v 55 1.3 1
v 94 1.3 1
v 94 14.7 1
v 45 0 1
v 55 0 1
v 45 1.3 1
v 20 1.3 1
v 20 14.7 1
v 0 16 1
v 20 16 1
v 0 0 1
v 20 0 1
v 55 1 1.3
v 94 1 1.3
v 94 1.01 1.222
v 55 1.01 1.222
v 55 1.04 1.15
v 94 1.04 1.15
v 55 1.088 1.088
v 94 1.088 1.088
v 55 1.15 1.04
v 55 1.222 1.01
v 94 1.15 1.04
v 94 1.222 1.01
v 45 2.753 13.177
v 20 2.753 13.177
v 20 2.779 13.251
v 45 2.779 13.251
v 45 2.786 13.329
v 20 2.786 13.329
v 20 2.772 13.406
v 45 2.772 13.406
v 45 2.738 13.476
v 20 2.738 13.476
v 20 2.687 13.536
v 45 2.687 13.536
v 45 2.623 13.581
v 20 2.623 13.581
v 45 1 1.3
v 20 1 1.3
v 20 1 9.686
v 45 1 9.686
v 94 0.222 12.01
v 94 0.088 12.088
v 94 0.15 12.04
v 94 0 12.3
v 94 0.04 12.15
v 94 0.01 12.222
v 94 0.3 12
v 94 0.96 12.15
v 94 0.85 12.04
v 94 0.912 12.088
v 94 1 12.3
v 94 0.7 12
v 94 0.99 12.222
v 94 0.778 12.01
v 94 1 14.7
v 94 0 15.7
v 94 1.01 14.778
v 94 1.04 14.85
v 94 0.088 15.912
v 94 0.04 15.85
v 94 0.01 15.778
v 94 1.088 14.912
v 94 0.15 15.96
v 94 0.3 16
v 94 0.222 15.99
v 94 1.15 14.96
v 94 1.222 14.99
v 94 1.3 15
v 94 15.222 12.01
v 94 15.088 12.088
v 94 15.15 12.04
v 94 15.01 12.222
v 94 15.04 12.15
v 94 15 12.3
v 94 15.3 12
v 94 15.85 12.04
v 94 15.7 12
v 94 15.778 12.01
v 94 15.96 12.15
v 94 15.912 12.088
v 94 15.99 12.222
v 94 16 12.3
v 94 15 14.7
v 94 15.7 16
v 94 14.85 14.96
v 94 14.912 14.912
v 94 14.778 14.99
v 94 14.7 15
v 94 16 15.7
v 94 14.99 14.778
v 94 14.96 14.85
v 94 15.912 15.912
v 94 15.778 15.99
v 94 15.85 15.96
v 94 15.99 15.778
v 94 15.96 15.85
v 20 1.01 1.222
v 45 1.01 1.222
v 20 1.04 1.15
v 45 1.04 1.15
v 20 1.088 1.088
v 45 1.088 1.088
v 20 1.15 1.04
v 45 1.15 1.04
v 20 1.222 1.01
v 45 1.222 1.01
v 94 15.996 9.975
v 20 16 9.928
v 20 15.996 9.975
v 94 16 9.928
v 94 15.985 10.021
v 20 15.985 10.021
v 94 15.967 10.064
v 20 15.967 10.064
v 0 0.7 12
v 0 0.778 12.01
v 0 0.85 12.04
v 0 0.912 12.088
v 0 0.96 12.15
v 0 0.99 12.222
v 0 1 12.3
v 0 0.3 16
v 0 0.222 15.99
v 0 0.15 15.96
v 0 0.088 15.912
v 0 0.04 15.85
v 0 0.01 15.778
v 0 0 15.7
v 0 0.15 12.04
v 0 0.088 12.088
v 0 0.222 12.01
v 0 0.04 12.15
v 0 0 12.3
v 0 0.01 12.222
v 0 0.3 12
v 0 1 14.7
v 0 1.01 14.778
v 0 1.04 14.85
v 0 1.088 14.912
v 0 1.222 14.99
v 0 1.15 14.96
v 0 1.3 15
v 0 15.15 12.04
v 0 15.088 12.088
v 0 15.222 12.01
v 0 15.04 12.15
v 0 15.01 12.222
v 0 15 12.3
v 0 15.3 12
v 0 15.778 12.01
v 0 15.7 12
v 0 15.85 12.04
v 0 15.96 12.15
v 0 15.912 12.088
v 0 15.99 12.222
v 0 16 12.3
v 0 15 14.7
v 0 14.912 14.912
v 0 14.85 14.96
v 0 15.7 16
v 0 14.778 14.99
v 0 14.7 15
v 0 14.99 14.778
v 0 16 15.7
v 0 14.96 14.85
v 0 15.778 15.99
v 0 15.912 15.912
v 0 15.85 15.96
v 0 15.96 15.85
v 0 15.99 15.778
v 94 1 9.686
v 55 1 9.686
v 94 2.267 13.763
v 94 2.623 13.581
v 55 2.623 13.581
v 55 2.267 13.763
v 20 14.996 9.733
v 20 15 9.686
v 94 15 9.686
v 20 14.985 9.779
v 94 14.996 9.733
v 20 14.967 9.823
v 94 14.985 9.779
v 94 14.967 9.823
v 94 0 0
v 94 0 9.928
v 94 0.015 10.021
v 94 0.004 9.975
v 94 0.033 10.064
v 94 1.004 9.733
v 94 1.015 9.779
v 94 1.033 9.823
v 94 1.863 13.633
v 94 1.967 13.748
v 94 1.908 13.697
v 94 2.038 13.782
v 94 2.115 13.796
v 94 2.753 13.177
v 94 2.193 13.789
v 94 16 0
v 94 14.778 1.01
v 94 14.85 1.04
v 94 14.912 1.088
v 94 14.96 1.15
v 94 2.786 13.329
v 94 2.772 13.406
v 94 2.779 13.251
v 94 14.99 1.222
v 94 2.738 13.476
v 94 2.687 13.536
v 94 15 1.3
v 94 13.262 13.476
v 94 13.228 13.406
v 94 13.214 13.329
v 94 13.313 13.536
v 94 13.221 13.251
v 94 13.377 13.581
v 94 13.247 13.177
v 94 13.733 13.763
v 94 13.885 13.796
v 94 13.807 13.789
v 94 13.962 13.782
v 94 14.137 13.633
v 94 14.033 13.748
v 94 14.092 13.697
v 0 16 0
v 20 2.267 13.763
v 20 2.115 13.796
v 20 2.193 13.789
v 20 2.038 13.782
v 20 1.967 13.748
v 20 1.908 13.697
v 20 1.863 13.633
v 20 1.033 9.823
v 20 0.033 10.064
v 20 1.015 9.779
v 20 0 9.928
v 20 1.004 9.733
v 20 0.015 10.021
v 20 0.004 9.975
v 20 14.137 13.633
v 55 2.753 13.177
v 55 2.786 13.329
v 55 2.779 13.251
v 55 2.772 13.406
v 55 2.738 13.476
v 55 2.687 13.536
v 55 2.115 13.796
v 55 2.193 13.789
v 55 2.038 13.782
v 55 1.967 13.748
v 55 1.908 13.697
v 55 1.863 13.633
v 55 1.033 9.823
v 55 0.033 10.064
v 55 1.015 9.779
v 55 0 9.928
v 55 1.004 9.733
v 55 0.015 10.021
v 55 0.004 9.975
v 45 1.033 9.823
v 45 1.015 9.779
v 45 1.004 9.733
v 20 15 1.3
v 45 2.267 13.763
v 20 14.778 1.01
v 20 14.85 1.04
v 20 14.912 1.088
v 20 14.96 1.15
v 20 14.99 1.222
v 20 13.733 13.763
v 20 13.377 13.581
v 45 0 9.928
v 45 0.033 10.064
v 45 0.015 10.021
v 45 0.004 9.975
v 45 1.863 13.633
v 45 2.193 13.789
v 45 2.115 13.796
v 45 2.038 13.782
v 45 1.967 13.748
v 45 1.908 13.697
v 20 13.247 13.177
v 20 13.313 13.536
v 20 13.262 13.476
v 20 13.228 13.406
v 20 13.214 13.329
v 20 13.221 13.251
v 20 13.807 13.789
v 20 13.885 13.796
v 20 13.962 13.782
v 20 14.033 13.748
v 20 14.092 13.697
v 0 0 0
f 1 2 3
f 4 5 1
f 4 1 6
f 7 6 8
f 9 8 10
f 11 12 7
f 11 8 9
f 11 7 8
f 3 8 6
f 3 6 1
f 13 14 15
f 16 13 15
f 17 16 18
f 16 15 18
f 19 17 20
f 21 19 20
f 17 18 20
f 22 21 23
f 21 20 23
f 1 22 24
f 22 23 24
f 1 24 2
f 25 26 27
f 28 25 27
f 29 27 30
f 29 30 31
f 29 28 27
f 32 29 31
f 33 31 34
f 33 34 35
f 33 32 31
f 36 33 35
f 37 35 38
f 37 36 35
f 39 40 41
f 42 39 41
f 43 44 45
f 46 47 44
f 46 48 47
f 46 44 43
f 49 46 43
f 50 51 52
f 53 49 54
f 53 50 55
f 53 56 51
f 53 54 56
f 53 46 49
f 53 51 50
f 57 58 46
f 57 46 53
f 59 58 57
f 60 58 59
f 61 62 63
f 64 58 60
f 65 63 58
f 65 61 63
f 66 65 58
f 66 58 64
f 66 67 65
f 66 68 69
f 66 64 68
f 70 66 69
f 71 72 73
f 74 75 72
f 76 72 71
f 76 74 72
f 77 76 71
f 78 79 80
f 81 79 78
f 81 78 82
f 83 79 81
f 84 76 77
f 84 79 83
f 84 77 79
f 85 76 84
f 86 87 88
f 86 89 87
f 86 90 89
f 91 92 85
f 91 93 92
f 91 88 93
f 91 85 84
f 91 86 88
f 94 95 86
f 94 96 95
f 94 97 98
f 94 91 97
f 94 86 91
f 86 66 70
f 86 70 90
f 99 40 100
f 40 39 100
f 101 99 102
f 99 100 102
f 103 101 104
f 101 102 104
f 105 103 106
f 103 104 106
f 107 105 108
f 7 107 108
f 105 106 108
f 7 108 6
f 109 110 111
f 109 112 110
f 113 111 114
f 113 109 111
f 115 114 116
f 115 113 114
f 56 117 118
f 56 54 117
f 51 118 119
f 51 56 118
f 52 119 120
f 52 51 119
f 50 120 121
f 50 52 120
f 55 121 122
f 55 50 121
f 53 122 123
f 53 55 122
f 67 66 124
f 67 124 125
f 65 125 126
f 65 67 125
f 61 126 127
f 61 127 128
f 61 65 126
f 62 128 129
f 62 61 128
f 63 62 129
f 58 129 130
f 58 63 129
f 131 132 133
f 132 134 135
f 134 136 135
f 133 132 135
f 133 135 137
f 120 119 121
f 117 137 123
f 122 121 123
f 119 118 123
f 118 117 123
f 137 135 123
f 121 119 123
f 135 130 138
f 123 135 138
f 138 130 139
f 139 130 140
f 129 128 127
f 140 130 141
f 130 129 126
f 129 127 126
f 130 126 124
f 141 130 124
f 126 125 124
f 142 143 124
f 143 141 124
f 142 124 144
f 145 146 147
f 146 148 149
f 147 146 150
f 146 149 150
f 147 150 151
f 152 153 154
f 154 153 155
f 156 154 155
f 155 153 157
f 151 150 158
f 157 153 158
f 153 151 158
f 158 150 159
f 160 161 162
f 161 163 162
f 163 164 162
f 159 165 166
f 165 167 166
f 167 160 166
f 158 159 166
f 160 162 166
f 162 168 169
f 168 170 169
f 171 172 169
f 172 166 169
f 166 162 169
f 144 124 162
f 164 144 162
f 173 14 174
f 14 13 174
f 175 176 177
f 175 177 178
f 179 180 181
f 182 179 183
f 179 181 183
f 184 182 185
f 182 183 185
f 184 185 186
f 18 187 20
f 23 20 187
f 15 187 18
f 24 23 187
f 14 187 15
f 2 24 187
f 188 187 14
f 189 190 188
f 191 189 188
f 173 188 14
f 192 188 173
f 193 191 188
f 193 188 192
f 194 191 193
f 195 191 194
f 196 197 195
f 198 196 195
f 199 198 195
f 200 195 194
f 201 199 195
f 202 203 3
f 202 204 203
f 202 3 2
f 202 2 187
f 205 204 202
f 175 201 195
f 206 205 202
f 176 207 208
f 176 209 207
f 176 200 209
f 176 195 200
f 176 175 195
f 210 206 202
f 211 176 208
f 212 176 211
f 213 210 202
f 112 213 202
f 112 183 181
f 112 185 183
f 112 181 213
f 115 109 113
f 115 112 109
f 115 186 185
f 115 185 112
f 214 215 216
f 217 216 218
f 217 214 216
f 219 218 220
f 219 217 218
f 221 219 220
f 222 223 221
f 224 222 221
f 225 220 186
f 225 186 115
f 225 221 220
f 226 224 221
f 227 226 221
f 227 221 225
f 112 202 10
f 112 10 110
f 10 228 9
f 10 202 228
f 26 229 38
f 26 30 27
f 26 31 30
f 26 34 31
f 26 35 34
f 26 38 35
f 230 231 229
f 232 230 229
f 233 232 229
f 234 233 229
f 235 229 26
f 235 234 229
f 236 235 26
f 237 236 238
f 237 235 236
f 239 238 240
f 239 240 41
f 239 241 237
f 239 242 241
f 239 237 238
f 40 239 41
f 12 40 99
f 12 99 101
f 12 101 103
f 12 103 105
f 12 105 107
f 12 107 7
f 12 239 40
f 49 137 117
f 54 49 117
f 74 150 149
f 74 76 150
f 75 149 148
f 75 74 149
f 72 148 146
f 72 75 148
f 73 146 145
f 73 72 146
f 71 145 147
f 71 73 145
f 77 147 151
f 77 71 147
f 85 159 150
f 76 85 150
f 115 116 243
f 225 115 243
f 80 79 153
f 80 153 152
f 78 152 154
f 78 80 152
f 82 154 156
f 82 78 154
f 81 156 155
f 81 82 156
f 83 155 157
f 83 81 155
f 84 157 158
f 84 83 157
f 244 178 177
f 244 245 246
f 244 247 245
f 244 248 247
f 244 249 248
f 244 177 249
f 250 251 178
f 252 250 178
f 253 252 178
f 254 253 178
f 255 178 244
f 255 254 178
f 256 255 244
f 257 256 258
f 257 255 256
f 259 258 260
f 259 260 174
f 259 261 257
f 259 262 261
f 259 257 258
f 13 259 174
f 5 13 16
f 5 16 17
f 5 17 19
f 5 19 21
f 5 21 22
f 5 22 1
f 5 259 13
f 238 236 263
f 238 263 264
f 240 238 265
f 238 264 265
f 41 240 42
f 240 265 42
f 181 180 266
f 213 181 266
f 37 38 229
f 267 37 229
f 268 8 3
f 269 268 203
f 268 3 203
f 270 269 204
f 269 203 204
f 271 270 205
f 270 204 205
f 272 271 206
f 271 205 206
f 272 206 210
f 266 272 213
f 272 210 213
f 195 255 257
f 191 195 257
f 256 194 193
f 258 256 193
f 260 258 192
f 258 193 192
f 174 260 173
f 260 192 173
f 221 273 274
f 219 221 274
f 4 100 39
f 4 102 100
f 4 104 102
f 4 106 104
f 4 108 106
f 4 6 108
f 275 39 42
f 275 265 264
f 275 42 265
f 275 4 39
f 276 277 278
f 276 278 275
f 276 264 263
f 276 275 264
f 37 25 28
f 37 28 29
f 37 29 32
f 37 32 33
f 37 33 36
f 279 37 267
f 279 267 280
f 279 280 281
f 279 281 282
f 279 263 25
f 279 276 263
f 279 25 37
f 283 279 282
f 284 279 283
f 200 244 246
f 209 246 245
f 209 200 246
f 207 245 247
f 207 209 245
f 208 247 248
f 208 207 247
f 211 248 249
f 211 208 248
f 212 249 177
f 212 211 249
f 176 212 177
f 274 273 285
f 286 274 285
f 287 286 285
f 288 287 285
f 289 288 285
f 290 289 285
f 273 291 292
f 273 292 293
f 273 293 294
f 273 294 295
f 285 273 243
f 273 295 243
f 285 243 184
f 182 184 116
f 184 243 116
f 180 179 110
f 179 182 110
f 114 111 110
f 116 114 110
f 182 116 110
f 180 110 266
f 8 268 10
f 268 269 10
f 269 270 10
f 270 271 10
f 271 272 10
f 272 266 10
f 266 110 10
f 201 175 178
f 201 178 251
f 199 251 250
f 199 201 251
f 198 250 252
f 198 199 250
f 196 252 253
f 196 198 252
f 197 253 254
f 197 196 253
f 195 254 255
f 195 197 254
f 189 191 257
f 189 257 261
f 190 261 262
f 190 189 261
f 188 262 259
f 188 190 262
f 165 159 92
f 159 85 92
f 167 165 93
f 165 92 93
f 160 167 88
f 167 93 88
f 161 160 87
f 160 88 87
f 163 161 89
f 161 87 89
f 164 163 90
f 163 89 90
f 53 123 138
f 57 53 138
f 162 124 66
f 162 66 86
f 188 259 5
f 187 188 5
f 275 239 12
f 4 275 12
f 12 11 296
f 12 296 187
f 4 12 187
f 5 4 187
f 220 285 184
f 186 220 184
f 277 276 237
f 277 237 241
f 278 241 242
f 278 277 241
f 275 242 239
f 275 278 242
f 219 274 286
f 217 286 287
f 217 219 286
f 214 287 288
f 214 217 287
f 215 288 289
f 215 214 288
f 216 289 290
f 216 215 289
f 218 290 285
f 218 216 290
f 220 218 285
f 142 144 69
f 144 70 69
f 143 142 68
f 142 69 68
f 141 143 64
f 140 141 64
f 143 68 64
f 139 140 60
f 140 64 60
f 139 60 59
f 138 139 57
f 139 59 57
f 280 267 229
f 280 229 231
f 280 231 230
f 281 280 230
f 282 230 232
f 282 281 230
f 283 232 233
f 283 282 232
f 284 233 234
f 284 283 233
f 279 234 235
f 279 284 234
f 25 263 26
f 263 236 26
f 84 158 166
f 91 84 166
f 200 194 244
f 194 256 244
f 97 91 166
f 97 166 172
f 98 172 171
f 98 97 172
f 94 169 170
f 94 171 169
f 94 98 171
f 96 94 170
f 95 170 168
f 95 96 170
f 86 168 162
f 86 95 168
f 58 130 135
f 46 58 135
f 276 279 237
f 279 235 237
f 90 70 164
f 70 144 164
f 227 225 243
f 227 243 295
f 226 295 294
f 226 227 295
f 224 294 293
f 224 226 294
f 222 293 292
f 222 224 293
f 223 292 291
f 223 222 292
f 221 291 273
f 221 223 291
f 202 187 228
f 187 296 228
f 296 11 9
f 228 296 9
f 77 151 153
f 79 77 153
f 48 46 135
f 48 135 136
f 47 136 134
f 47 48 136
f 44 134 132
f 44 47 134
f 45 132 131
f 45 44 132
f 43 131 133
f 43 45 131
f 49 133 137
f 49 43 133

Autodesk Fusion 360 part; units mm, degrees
sketch "16 mm x 16 mm conduit piping shape" plane through (0, 0, 0) normal (1, 0, 0) x (0, 1, 0)
  line L0 (0, 0) -> (16, 0)
  line L1 (16, 0) -> (16, 10)
  line L2 (16, 10) -> (14, 13.9)
  line L3 (14, 13.9) -> (13.1102, 13.4437)
  line L4 (13.1102, 13.4437) -> (15, 9.7585)
  line L5 (15, 9.7585) -> (15, 1)
  line L6 (15, 1) -> (1, 1)
  line L7 (1, 1) -> (1, 9.7585)
  line L8 (1, 9.7585) -> (2.8898, 13.4437)
  line L9 (2.8898, 13.4437) -> (2, 13.9)
  line L10 (2, 13.9) -> (0, 10)
  line L11 (0, 10) -> (0, 0)
  line L12 (0, 16) -> (16, 16)
  line L13 (0, 16) -> (0, 12)
  line L14 (0, 12) -> (1, 12)
  line L15 (1, 12) -> (1, 15)
  line L16 (1, 15) -> (15, 15)
  line L17 (15, 15) -> (15, 12)
  line L18 (15, 12) -> (16, 12)
  line L19 (16, 12) -> (16, 16)
  dimension "d1" = 1
  dimension "d2" = 16
  dimension "d3" = 1
  dimension "d4" = 1
  dimension "d7" = 10
  dimension "d8" = 10
  dimension "d9" = 16
  dimension "d10" = 1
  dimension "d11" = 1
  dimension "d12" = 1
  dimension "d13" = 4
  dimension "d14" = 4
  dimension "d15" = 16
  dimension "d16" = 2
  dimension "d17" = 2
  dimension "d18" = 1
  dimension "d19" = 1
extrude "Extrude1" add sketch "16 mm x 16 mm conduit piping shape" along normal blind 94 makes body 1 at (31.3333, 5.3333, 16) makes body 2 at (31.3333, 5.3333, 0)
fillet "Fillet1" radius 0.3 18 edges at (47, 0, 16) (47, 16, 16) (47, 16, 12) (47, 0, 12) (47, 1, 12) (47, 15, 12) (47, 1, 15) (47, 15, 15) (47, 0, 10) (47, 16, 10) (47, 14, 13.9) (47, 13.1102, 13.4437) (47, 2, 13.9) (47, 2.8898, 13.4437) (47, 15, 1) (47, 1, 1) (47, 1, 9.7585) (47, 15, 9.7585) on bodies 1 2
sketch "Sketch2" plane through (0, 0, 0) normal (0, -1, 0) x (1, 0, 0)
  line L0 (94, 9.9276) -> (0, 9.9276)
  line L1 (0, 9.9276) -> (0, 0)
  line L2 (0, 0) -> (94, 0)
  line L3 (94, 0) -> (94, 9.9276)
  line L4 (0, 15) -> (20, 15)
  line L5 (20, 15) -> (20, 1)
  line L6 (20, 1) -> (0, 1)
  line L7 (0, 1) -> (0, 15)
  line L8 (45, 15) -> (55, 15)
  line L9 (55, 15) -> (55, 1)
  line L10 (55, 1) -> (45, 1)
  line L11 (45, 1) -> (45, 15)
  dimension "d25" = 20
  dimension "d26" = 1
  dimension "d27" = 25
  dimension "d28" = 10
  dimension "d29" = 1
extrude "Extrude2" cut sketch "Sketch2" against normal blind 3 contours L0 L9 L10 L11 | L0 L8 L9 L11 | L0 L1 L5 L6 L7 | L0 L4 L5 L7 bodies 2
sketch "Sketch3" plane through (0, 16, 0) normal (0, 1, 0) x (-1, 0, 0)
  line L0 (0, 9.9276) -> (-94, 9.9276)
  line L1 (-94, 9.9276) -> (-94, 0)
  line L2 (-94, 0) -> (0, 0)
  line L3 (0, 0) -> (0, 9.9276)
  line L4 (0, 15) -> (-20, 15)
  line L5 (-20, 15) -> (-20, 1)
  line L6 (-20, 1) -> (0, 1)
  line L7 (0, 1) -> (0, 15)
  dimension "d32" = 20
  dimension "d33" = 1
extrude "Extrude3" cut sketch "Sketch3" against normal blind 3 contours L0 L3 L5 L6 L7 | L0 L4 L5 L7 bodies 2
equation "d1 = conduitThickness"
equation "d2 = conduitWidth"
equation "d3 = conduitThickness"
equation "d4 = conduitThickness"
equation "conduitThickness = 1 mm" comment "Thickness of the PVC conduit piping"
equation "conduitWidth = 16 mm" comment "Size of the outer dimensions of the conduit piping"
equation "d9 = conduitWidth"
equation "d10 = conduitThickness"
equation "d11 = conduitThickness"
equation "d12 = conduitThickness"
